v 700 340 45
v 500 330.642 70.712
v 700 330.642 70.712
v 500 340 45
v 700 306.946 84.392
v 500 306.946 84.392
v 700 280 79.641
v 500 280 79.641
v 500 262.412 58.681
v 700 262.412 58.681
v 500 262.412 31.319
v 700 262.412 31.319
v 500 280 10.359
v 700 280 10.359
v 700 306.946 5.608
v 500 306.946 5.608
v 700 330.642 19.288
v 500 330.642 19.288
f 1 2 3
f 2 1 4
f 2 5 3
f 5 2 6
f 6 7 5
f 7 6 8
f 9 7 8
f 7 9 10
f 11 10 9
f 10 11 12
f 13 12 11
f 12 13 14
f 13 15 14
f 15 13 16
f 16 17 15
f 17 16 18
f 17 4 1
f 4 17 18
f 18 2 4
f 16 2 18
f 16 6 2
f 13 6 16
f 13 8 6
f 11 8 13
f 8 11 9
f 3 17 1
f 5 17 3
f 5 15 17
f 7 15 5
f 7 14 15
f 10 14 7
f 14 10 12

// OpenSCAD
module Staender()
{
    color("red"){
        translate([-50,-500,0]) cube([1000,1000,5], centre=false);
        translate([0, 0, 5]) cylinder(h=1000, r=50, center=     false);
    }
}
module Oberarm()
{
    color("orange"){
        translate([0, 0, 700]) rotate([0,90,0]) cylinder(h=500,     r=30, center=false);
        translate([500, 0, 600])  cylinder(h=140, r=30, center=      false);
    }
}
module Unterarm()
{
    color("yellow"){
        translate([500, 0, 640]) rotate([0,90,0]) cylinder(h=500     , r=30, center=false);
        translate([1000, 0, 640]) sphere(r=50, center=false);
    }
}
module Hand()
{
    color("blue"){
        translate([1000, 0, 640]) rotate([0,90,0]) cylinder(h=50     , r=30, center=false);
        translate([1050, 0, 540]) cube([5,10,125], center=false);
        translate([1050, 5, 660]) cube([100,10,5], center=false);
        translate([1050, -15, 660]) cube([100,10,5], center=false);
    }
}
module Finger()
{
    color("purple"){
        translate([1055, -5, 540]) cube([95,10,5], center=false);
    }
}
module Garbage1()
{
    color("black"){
        translate([500, 300, 45]) rotate([90,0,90]) cylinder(h=200,r=40, center=false);
    }
}
module Robo()
{
    Staender();
    Oberarm();
    Unterarm();
    Hand();
    Finger();
    Garbage1();
}
$fa=40;
Garbage1();
//Robo();
//Staender();
//Oberarm();
//Unterarm();
//Hand();
//Finger();
